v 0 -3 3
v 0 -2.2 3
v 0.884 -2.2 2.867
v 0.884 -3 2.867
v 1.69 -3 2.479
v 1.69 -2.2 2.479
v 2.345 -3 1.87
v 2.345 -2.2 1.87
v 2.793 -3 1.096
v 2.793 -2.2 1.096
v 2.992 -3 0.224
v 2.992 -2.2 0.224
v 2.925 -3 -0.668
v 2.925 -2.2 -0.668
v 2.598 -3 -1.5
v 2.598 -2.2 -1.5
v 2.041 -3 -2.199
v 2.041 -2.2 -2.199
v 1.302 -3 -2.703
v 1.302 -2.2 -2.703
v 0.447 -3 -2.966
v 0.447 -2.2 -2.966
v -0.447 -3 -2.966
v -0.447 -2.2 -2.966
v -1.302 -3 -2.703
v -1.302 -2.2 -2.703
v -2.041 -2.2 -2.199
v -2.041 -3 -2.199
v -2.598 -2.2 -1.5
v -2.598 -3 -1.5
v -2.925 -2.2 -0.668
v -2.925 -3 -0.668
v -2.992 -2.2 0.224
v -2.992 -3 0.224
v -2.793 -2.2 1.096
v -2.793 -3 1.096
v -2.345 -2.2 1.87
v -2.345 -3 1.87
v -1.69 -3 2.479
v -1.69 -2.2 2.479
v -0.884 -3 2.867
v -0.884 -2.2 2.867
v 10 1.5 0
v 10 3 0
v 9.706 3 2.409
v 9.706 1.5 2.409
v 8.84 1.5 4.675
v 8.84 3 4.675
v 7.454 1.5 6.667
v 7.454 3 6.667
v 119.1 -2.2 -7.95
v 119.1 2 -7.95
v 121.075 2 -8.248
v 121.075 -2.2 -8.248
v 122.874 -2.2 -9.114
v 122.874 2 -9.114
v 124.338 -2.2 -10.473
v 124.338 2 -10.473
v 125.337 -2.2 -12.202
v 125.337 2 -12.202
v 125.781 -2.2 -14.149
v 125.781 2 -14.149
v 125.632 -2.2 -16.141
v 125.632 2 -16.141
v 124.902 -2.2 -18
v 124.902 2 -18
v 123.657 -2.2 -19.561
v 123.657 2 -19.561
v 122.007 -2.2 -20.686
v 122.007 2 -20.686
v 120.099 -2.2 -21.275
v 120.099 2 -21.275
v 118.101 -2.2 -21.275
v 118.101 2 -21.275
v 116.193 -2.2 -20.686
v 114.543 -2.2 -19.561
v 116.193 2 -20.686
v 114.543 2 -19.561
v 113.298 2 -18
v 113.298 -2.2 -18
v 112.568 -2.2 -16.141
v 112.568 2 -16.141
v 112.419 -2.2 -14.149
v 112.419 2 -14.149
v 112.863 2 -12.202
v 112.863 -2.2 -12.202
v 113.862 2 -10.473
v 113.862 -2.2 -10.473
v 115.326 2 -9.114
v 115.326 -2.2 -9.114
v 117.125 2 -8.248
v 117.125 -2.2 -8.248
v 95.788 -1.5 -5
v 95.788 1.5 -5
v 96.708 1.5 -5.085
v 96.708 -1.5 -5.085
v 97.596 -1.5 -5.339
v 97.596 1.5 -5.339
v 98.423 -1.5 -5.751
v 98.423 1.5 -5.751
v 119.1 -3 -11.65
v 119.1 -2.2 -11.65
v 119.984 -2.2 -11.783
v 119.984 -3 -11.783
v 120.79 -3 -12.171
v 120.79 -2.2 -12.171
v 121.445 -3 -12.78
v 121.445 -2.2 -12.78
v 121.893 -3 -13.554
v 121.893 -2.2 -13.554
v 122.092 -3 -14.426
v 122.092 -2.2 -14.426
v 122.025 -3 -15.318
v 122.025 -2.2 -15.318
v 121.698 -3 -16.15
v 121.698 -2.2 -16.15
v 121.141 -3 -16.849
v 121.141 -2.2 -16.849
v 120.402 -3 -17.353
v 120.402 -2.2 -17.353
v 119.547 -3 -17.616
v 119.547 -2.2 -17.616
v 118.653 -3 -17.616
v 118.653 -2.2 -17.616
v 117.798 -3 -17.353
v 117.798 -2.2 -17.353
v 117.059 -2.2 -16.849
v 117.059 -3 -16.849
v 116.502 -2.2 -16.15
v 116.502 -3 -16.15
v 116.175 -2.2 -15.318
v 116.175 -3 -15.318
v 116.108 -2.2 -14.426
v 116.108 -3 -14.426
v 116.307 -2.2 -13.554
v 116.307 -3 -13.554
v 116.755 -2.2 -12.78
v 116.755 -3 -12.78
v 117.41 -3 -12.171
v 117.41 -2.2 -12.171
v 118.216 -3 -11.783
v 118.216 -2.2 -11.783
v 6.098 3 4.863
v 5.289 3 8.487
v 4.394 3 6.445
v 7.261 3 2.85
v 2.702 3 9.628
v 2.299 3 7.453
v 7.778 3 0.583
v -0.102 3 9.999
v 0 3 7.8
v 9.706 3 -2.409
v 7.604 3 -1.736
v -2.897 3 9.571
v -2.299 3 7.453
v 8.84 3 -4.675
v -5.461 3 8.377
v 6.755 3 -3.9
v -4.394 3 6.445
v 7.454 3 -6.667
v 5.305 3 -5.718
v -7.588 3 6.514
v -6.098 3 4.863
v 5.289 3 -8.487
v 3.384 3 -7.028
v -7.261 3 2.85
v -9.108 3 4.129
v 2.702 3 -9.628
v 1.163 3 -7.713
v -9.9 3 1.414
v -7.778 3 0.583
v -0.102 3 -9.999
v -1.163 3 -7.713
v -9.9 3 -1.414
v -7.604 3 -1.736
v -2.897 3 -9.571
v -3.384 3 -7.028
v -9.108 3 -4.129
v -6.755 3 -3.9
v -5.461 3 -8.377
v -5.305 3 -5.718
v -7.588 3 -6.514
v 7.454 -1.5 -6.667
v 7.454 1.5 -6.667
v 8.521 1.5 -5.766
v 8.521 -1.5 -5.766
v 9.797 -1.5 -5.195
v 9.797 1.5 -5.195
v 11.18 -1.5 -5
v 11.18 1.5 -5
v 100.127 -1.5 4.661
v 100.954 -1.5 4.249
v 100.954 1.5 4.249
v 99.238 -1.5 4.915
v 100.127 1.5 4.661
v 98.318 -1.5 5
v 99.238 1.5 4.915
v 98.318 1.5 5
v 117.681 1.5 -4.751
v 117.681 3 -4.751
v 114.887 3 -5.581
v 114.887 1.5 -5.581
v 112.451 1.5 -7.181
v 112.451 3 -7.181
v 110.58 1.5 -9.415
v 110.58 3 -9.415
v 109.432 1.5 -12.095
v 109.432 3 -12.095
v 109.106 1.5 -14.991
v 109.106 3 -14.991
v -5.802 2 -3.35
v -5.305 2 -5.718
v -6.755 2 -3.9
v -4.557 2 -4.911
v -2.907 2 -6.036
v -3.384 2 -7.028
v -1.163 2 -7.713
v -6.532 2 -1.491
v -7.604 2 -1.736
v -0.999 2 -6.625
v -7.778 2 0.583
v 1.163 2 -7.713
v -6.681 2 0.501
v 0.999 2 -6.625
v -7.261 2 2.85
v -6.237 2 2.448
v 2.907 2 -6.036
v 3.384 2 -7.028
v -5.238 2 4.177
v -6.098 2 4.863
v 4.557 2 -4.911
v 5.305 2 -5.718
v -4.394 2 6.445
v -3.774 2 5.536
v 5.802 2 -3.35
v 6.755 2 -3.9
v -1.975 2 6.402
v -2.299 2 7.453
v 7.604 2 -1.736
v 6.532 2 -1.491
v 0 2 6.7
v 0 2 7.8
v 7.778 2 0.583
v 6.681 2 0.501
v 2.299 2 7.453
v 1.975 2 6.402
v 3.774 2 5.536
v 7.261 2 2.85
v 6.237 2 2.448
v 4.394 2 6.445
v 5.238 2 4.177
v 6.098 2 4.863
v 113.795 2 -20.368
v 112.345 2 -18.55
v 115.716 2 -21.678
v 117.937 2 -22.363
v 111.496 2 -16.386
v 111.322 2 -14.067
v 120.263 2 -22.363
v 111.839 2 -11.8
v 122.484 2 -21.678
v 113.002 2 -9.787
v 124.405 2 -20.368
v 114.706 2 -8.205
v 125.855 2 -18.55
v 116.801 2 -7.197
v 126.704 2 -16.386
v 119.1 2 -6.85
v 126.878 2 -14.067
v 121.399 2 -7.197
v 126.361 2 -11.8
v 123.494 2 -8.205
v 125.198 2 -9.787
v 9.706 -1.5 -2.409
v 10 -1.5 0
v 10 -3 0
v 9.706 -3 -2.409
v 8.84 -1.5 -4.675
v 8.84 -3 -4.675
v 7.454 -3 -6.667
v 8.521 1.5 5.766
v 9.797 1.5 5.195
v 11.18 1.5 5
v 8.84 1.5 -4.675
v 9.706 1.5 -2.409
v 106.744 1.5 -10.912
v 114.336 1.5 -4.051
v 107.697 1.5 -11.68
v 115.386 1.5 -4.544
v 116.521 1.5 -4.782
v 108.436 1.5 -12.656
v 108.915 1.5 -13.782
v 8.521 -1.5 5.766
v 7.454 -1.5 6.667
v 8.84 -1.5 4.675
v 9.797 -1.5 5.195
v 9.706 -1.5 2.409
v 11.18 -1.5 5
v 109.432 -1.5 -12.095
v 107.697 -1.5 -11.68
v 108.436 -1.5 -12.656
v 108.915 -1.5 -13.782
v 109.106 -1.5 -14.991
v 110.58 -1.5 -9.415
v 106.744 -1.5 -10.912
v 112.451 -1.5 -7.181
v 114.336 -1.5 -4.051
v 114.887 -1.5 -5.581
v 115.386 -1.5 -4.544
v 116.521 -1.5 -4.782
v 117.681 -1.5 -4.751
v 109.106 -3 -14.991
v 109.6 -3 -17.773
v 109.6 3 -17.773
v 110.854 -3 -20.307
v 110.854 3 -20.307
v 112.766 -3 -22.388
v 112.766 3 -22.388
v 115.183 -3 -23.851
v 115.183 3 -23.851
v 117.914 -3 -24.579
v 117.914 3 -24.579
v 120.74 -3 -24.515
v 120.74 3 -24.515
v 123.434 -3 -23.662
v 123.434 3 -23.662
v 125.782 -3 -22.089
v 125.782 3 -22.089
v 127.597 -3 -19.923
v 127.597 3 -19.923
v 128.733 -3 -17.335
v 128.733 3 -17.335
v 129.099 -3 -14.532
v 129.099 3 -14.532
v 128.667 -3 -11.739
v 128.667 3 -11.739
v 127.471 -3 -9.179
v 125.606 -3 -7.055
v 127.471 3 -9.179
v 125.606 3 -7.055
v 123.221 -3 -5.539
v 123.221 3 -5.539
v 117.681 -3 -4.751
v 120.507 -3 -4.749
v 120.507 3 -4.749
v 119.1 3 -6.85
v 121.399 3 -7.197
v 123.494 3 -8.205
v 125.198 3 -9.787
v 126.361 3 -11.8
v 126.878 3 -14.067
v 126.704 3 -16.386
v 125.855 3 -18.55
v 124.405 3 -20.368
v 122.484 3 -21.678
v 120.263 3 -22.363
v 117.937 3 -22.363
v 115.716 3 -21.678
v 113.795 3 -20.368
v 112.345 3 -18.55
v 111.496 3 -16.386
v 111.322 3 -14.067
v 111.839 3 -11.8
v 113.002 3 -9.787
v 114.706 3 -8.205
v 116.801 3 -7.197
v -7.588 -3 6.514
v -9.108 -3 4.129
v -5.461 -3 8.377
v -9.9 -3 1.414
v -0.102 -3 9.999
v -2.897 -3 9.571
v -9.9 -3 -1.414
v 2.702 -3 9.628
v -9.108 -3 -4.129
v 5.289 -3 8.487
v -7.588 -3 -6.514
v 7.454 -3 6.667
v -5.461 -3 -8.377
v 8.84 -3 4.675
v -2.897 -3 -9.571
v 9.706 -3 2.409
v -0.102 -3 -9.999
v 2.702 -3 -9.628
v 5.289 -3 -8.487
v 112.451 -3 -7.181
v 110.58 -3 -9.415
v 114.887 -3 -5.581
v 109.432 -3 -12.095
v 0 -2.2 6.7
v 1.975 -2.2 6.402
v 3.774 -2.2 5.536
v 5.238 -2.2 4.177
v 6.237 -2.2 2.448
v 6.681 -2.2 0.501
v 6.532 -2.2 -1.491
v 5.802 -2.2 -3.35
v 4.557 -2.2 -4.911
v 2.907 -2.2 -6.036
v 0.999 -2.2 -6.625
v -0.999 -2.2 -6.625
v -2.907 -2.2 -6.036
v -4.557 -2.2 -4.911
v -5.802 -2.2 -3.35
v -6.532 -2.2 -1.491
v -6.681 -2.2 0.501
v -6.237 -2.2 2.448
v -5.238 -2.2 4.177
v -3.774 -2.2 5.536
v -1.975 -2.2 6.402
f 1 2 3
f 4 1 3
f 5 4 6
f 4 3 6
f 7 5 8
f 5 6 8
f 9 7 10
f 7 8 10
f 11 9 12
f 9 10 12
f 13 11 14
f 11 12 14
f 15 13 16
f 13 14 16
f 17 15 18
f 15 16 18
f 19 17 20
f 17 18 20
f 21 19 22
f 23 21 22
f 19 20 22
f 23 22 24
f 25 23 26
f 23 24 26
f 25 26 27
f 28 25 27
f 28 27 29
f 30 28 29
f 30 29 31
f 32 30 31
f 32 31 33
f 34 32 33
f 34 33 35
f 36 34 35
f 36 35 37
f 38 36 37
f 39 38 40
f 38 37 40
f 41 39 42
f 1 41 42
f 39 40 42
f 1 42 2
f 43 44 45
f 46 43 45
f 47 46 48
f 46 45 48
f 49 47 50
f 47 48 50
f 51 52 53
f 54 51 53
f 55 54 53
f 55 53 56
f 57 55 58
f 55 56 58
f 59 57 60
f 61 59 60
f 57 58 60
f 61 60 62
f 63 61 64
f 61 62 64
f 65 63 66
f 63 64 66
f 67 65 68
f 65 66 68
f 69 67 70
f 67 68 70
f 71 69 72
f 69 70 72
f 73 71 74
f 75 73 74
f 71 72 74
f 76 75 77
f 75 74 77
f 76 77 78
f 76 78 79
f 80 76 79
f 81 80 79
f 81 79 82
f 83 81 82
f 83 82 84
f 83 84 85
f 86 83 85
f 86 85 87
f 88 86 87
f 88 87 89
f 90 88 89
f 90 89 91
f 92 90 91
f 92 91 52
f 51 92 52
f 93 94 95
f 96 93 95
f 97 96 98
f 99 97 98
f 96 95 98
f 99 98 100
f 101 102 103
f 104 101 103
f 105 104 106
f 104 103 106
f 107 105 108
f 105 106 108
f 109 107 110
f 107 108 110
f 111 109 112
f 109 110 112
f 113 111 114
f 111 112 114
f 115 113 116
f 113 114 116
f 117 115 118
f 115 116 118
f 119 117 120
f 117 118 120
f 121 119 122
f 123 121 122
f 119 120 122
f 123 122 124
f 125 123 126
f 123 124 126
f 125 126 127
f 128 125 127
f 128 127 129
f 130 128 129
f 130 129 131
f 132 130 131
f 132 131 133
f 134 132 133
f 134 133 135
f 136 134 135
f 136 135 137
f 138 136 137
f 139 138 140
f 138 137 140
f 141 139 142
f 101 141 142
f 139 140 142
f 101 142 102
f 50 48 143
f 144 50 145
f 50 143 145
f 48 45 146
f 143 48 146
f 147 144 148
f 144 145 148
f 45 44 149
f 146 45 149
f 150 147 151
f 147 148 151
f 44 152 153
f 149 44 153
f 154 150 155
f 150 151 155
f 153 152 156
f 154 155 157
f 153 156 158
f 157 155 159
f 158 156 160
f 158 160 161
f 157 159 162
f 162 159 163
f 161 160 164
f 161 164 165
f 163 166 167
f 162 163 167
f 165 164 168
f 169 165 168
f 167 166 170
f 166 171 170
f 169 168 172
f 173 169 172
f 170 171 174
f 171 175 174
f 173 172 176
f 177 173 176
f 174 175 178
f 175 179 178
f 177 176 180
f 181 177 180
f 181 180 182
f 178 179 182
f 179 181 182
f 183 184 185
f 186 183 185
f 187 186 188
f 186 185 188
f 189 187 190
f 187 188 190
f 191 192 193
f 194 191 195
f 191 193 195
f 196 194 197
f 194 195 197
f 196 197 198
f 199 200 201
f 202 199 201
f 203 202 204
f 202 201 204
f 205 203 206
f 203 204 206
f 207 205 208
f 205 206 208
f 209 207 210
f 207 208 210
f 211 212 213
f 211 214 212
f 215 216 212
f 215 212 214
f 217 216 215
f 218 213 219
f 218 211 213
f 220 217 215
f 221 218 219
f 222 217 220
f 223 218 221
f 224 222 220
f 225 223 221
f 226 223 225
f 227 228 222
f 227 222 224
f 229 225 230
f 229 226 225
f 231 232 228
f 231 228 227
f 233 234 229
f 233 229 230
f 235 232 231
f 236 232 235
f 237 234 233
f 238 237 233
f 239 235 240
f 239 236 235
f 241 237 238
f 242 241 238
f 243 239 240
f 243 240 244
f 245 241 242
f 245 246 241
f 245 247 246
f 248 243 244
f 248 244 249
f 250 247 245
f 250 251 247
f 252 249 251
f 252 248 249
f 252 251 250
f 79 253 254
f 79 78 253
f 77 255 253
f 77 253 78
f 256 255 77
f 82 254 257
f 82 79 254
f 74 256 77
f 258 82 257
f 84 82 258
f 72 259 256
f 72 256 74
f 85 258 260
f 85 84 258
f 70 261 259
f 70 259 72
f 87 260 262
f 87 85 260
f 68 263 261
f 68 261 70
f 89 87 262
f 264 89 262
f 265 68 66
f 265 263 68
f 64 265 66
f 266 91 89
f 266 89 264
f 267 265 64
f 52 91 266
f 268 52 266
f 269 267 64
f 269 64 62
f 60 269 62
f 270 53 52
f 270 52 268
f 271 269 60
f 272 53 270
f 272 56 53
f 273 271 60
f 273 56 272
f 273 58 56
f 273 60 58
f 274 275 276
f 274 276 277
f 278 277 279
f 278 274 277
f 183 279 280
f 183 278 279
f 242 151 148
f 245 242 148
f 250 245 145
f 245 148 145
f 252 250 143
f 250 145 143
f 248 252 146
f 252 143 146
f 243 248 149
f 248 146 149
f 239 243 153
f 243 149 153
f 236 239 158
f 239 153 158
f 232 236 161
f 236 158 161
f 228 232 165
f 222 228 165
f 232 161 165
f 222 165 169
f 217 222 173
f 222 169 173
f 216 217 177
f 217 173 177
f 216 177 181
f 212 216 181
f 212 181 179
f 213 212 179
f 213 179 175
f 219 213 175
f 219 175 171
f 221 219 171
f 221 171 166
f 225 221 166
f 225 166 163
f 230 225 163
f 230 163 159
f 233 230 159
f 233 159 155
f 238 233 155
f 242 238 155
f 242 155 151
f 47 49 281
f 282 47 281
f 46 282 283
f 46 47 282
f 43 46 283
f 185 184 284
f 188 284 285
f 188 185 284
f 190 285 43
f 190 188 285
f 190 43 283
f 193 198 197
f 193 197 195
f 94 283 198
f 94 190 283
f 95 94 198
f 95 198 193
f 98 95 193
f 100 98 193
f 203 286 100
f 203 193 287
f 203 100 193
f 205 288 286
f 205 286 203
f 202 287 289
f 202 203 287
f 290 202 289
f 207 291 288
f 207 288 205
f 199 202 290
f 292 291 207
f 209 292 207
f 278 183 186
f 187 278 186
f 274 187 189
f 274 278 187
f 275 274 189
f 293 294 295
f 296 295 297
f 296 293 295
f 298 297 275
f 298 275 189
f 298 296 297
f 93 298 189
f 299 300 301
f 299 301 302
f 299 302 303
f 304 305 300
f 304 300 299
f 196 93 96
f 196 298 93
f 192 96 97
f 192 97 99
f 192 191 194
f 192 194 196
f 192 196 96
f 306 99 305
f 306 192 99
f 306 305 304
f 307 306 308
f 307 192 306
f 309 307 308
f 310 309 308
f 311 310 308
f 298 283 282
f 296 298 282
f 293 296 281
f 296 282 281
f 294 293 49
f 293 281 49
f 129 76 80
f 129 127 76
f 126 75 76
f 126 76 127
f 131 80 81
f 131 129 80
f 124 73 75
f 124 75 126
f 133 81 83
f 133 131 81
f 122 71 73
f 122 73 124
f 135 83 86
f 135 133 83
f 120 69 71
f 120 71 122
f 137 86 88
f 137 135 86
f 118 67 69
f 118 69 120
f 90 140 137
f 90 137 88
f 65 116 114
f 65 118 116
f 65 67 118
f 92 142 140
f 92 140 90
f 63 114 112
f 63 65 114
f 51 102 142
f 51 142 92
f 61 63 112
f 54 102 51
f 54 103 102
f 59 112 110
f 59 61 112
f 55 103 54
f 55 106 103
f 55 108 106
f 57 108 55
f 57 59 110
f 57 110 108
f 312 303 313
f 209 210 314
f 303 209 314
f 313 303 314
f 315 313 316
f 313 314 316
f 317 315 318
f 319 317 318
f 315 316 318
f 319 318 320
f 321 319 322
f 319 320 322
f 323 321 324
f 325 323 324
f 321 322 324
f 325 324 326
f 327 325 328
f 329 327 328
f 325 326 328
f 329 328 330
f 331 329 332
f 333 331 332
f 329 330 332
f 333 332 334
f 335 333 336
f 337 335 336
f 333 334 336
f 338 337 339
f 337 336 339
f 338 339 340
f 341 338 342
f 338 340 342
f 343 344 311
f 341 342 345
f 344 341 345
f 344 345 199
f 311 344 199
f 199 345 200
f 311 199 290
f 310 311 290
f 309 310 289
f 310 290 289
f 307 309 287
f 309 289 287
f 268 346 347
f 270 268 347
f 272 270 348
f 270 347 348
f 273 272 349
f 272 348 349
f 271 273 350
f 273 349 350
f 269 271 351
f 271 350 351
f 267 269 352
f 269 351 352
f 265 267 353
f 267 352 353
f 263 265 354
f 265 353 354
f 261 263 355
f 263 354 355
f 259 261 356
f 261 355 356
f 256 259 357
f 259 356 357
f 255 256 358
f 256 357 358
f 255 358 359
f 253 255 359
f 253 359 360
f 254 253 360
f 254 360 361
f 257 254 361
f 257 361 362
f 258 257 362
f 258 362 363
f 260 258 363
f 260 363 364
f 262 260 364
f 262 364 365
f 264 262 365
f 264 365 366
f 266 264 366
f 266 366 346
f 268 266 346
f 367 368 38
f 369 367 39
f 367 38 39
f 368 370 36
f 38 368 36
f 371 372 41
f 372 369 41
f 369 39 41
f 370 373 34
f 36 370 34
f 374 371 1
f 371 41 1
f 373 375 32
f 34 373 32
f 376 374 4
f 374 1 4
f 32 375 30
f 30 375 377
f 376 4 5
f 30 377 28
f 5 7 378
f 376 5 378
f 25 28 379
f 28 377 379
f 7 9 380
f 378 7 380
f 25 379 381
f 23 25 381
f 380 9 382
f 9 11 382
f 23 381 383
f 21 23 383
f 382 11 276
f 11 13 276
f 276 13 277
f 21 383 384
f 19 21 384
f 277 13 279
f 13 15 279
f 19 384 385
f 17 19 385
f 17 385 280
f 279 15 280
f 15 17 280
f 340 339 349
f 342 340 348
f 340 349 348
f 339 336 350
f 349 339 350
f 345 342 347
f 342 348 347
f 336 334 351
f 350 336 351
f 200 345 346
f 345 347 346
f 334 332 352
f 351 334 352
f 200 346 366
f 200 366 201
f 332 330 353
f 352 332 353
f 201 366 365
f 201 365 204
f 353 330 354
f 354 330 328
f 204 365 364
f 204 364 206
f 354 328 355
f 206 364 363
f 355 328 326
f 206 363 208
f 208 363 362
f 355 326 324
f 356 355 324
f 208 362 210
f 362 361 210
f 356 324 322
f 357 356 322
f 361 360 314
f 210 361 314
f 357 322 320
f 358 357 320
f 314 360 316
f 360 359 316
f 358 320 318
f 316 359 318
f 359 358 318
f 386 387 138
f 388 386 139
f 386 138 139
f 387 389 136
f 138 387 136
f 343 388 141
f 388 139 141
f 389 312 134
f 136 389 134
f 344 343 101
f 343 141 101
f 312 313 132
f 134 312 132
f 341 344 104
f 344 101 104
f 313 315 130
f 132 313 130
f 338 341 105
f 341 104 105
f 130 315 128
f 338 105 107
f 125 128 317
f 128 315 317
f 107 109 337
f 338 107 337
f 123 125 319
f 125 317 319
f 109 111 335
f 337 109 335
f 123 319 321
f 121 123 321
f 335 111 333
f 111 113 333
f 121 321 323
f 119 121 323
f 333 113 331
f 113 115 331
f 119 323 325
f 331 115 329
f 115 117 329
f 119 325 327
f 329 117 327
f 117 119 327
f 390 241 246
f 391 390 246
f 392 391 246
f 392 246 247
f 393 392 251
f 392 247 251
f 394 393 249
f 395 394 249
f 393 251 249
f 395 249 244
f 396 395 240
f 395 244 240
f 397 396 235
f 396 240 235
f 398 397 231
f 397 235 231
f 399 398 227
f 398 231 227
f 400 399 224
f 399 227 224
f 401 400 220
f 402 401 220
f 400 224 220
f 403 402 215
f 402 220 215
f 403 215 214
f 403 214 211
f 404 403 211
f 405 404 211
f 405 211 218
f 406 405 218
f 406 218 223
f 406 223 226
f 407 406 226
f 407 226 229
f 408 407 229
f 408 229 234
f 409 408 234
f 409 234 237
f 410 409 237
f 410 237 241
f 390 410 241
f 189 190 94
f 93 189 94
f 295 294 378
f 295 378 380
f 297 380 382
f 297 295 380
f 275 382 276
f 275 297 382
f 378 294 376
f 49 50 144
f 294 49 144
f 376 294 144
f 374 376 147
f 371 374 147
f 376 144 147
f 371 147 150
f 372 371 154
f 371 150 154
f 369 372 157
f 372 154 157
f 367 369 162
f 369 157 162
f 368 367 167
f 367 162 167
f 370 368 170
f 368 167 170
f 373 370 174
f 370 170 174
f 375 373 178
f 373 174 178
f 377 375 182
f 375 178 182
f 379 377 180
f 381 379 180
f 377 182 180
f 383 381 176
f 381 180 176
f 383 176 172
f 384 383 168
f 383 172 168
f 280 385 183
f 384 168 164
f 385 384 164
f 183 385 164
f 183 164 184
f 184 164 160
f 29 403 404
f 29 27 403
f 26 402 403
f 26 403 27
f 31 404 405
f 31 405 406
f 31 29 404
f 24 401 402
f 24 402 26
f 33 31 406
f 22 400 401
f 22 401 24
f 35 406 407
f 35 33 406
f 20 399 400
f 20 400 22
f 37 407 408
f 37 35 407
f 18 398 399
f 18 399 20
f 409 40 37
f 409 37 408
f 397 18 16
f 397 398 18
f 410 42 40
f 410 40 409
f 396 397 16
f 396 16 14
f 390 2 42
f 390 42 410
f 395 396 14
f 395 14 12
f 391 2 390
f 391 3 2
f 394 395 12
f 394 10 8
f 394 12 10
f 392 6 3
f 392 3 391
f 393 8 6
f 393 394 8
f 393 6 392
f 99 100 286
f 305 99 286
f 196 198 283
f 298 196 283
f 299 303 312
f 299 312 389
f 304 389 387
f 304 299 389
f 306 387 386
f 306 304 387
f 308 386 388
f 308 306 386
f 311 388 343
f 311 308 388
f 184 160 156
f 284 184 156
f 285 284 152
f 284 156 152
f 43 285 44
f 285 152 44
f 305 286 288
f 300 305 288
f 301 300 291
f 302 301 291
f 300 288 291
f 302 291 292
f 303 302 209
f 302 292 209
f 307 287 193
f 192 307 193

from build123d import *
from build123d.topology import SkipClean

# Parameters (mm, degrees)
SKETCH1_R           = 7.8
SKETCH1_R_2         = 3
BOSS_EXTRUDE2_DEPTH = 3
SKETCH2_R           = 7.8
CUT_EXTRUDE1_DEPTH  = 1
SKETCH3_R           = 6.7
CUT_EXTRUDE2_DEPTH  = 5.2
CUT_EXTRUDE4_DEPTH  = 1.5
CUT_EXTRUDE5_START  = -1.5
CUT_EXTRUDE5_DEPTH  = 1.5


with BuildPart() as part:
    # Sketch1 → Boss-Extrude2 (new, symmetric)
    # profile 1 of 3: a face of its own
    with BuildSketch(Plane(origin=(0, 0, 0), x_dir=(1, 0, 0), z_dir=(0, 1, 0))):
        with BuildLine():
            ThreePointArc((7.453559925, 6.666666667), (9.139098435, 5.435645354), (11.180339887, 5))
            Line((11.180339887, 5), (95.787507262, 5))
            ThreePointArc((95.787507262, 5), (97.157669446, 5.191397751), (98.422933246, 5.750937765))
            Line((98.422933246, 5.750937765), (106.744136599, 10.912056694))
            ThreePointArc((106.744136599, 10.912056694), (108.435692963, 12.655680094), (109.105807076, 14.990745953))
            ThreePointArc((109.105807076, 14.990745953), (126.766700664, 21.070412832), (117.680813085, 4.751216817))
            ThreePointArc((117.680813085, 4.751216817), (115.946610906, 4.695717028), (114.335793643, 4.050887461))
            Line((114.335793643, 4.050887461), (100.953895224, -4.249062235))
            ThreePointArc((100.953895224, -4.249062235), (99.688631423, -4.808602249), (98.318469239, -5))
            Line((98.318469239, -5), (11.180339887, -5))
            ThreePointArc((11.180339887, -5), (9.139098435, -5.435645354), (7.453559925, -6.666666667))
            ThreePointArc((7.453559925, -6.666666667), (-10, 0), (7.453559925, 6.666666667))
        make_face()
        with Locations((119.1, 14.65)):
            Circle(SKETCH1_R, mode=Mode.SUBTRACT)
        Circle(SKETCH1_R, mode=Mode.SUBTRACT)
    # profile 2 of 3: a face of its own
    with BuildSketch(Plane(origin=(0, 0, 0), x_dir=(1, 0, 0), z_dir=(0, 1, 0))):
        Circle(SKETCH1_R)
        with Locations(Location((0, 0, 0), (0, 0, 270))):
            Circle(SKETCH1_R_2, mode=Mode.SUBTRACT)
    # profile 3 of 3: a face of its own
    with BuildSketch(Plane(origin=(0, 0, 0), x_dir=(1, 0, 0), z_dir=(0, 1, 0))):
        with Locations((119.1, 14.65)):
            Circle(SKETCH1_R)
        with Locations(Location((119.1, 14.65, 0), (0, 0, 270))):
            Circle(SKETCH1_R_2, mode=Mode.SUBTRACT)
    extrude(amount=BOSS_EXTRUDE2_DEPTH, both=True)

    # Sketch2 → Cut-Extrude1 (cut)
    with BuildSketch(Plane(origin=(0, 3, 0), x_dir=(1, 0, 0), z_dir=(0, 1, 0))):
        with Locations(Location((119.1, 14.65, 0), (0, 0, 270))):
            Circle(SKETCH2_R)
        with Locations(Location((0, 0, 0), (0, 0, 270))):
            Circle(SKETCH2_R)
    extrude(amount=-CUT_EXTRUDE1_DEPTH, mode=Mode.SUBTRACT)

    # Sketch3 → Cut-Extrude2 (cut)
    with BuildSketch(Plane(origin=(0, 3, 0), x_dir=(1, 0, 0), z_dir=(0, 1, 0))):
        with Locations(Location((0, 0, 0), (0, 0, 270))):
            Circle(SKETCH3_R)
        with Locations(Location((119.1, 14.65, 0), (0, 0, 270))):
            Circle(SKETCH3_R)
    extrude(amount=-CUT_EXTRUDE2_DEPTH, mode=Mode.SUBTRACT)

    # Sketch4 → Cut-Extrude4 (cut)
    with BuildSketch(Plane(origin=(0, 3, 0), x_dir=(1, 0, 0), z_dir=(0, 1, 0))):
        with BuildLine():
            Line((106.744136599, 10.912056694), (98.422933246, 5.750937765))
            ThreePointArc((98.422933246, 5.750937765), (97.157669446, 5.191397751), (95.787507262, 5))
            Line((95.787507262, 5), (11.180339887, 5))
            ThreePointArc((11.180339887, 5), (9.139098435, 5.435645354), (7.453559925, 6.666666667))
            ThreePointArc((7.453559925, 6.666666667), (9.34172359, 3.568220898), (10, 0))
            ThreePointArc((10, 0), (9.34172359, -3.568220898), (7.453559925, -6.666666667))
            ThreePointArc((7.453559925, -6.666666667), (9.139098435, -5.435645354), (11.180339887, -5))
            Line((11.180339887, -5), (98.318469239, -5))
            ThreePointArc((98.318469239, -5), (99.688631423, -4.808602249), (100.953895224, -4.249062235))
            Line((100.953895224, -4.249062235), (114.335793643, 4.050887461))
            ThreePointArc((114.335793643, 4.050887461), (115.946610906, 4.695717028), (117.680813085, 4.751216817))
            ThreePointArc((117.680813085, 4.751216817), (111.433299336, 8.229587168), (109.105807076, 14.990745953))
            ThreePointArc((109.105807076, 14.990745953), (108.435692963, 12.655680094), (106.744136599, 10.912056694))
        make_face()
    extrude(amount=-CUT_EXTRUDE4_DEPTH, mode=Mode.SUBTRACT)

    # Sketch5 → Cut-Extrude5 (cut)
    with SkipClean():  # the faces are left unmerged after this step: merging them gives an invalid solid
        with BuildSketch(Plane.XZ.offset(3).offset(CUT_EXTRUDE5_START)):
            with BuildLine():
                ThreePointArc((7.453559925, 6.666666667), (9.34172359, 3.568220898), (10, 0))
                ThreePointArc((10, 0), (9.34172359, -3.568220898), (7.453559925, -6.666666667))
                ThreePointArc((7.453559925, -6.666666667), (9.139098435, -5.435645354), (11.180339887, -5))
                Line((11.180339887, -5), (95.787507262, -5))
                ThreePointArc((95.787507262, -5), (97.157669446, -5.191397751), (98.422933246, -5.750937765))
                Line((98.422933246, -5.750937765), (106.744136599, -10.912056694))
                ThreePointArc((106.744136599, -10.912056694), (108.435692963, -12.655680094), (109.105807076, -14.990745953))
                ThreePointArc((109.105807076, -14.990745953), (111.433299336, -8.229587168), (117.680813085, -4.751216817))
                ThreePointArc((117.680813085, -4.751216817), (115.946610906, -4.695717028), (114.335793643, -4.050887461))
                Line((114.335793643, -4.050887461), (100.953895224, 4.249062235))
                ThreePointArc((100.953895224, 4.249062235), (99.688631423, 4.808602249), (98.318469239, 5))
                Line((98.318469239, 5), (11.180339887, 5))
                ThreePointArc((11.180339887, 5), (9.139098435, 5.435645354), (7.453559925, 6.666666667))
            make_face()
        extrude(amount=CUT_EXTRUDE5_DEPTH, mode=Mode.SUBTRACT)


solid = part.part
